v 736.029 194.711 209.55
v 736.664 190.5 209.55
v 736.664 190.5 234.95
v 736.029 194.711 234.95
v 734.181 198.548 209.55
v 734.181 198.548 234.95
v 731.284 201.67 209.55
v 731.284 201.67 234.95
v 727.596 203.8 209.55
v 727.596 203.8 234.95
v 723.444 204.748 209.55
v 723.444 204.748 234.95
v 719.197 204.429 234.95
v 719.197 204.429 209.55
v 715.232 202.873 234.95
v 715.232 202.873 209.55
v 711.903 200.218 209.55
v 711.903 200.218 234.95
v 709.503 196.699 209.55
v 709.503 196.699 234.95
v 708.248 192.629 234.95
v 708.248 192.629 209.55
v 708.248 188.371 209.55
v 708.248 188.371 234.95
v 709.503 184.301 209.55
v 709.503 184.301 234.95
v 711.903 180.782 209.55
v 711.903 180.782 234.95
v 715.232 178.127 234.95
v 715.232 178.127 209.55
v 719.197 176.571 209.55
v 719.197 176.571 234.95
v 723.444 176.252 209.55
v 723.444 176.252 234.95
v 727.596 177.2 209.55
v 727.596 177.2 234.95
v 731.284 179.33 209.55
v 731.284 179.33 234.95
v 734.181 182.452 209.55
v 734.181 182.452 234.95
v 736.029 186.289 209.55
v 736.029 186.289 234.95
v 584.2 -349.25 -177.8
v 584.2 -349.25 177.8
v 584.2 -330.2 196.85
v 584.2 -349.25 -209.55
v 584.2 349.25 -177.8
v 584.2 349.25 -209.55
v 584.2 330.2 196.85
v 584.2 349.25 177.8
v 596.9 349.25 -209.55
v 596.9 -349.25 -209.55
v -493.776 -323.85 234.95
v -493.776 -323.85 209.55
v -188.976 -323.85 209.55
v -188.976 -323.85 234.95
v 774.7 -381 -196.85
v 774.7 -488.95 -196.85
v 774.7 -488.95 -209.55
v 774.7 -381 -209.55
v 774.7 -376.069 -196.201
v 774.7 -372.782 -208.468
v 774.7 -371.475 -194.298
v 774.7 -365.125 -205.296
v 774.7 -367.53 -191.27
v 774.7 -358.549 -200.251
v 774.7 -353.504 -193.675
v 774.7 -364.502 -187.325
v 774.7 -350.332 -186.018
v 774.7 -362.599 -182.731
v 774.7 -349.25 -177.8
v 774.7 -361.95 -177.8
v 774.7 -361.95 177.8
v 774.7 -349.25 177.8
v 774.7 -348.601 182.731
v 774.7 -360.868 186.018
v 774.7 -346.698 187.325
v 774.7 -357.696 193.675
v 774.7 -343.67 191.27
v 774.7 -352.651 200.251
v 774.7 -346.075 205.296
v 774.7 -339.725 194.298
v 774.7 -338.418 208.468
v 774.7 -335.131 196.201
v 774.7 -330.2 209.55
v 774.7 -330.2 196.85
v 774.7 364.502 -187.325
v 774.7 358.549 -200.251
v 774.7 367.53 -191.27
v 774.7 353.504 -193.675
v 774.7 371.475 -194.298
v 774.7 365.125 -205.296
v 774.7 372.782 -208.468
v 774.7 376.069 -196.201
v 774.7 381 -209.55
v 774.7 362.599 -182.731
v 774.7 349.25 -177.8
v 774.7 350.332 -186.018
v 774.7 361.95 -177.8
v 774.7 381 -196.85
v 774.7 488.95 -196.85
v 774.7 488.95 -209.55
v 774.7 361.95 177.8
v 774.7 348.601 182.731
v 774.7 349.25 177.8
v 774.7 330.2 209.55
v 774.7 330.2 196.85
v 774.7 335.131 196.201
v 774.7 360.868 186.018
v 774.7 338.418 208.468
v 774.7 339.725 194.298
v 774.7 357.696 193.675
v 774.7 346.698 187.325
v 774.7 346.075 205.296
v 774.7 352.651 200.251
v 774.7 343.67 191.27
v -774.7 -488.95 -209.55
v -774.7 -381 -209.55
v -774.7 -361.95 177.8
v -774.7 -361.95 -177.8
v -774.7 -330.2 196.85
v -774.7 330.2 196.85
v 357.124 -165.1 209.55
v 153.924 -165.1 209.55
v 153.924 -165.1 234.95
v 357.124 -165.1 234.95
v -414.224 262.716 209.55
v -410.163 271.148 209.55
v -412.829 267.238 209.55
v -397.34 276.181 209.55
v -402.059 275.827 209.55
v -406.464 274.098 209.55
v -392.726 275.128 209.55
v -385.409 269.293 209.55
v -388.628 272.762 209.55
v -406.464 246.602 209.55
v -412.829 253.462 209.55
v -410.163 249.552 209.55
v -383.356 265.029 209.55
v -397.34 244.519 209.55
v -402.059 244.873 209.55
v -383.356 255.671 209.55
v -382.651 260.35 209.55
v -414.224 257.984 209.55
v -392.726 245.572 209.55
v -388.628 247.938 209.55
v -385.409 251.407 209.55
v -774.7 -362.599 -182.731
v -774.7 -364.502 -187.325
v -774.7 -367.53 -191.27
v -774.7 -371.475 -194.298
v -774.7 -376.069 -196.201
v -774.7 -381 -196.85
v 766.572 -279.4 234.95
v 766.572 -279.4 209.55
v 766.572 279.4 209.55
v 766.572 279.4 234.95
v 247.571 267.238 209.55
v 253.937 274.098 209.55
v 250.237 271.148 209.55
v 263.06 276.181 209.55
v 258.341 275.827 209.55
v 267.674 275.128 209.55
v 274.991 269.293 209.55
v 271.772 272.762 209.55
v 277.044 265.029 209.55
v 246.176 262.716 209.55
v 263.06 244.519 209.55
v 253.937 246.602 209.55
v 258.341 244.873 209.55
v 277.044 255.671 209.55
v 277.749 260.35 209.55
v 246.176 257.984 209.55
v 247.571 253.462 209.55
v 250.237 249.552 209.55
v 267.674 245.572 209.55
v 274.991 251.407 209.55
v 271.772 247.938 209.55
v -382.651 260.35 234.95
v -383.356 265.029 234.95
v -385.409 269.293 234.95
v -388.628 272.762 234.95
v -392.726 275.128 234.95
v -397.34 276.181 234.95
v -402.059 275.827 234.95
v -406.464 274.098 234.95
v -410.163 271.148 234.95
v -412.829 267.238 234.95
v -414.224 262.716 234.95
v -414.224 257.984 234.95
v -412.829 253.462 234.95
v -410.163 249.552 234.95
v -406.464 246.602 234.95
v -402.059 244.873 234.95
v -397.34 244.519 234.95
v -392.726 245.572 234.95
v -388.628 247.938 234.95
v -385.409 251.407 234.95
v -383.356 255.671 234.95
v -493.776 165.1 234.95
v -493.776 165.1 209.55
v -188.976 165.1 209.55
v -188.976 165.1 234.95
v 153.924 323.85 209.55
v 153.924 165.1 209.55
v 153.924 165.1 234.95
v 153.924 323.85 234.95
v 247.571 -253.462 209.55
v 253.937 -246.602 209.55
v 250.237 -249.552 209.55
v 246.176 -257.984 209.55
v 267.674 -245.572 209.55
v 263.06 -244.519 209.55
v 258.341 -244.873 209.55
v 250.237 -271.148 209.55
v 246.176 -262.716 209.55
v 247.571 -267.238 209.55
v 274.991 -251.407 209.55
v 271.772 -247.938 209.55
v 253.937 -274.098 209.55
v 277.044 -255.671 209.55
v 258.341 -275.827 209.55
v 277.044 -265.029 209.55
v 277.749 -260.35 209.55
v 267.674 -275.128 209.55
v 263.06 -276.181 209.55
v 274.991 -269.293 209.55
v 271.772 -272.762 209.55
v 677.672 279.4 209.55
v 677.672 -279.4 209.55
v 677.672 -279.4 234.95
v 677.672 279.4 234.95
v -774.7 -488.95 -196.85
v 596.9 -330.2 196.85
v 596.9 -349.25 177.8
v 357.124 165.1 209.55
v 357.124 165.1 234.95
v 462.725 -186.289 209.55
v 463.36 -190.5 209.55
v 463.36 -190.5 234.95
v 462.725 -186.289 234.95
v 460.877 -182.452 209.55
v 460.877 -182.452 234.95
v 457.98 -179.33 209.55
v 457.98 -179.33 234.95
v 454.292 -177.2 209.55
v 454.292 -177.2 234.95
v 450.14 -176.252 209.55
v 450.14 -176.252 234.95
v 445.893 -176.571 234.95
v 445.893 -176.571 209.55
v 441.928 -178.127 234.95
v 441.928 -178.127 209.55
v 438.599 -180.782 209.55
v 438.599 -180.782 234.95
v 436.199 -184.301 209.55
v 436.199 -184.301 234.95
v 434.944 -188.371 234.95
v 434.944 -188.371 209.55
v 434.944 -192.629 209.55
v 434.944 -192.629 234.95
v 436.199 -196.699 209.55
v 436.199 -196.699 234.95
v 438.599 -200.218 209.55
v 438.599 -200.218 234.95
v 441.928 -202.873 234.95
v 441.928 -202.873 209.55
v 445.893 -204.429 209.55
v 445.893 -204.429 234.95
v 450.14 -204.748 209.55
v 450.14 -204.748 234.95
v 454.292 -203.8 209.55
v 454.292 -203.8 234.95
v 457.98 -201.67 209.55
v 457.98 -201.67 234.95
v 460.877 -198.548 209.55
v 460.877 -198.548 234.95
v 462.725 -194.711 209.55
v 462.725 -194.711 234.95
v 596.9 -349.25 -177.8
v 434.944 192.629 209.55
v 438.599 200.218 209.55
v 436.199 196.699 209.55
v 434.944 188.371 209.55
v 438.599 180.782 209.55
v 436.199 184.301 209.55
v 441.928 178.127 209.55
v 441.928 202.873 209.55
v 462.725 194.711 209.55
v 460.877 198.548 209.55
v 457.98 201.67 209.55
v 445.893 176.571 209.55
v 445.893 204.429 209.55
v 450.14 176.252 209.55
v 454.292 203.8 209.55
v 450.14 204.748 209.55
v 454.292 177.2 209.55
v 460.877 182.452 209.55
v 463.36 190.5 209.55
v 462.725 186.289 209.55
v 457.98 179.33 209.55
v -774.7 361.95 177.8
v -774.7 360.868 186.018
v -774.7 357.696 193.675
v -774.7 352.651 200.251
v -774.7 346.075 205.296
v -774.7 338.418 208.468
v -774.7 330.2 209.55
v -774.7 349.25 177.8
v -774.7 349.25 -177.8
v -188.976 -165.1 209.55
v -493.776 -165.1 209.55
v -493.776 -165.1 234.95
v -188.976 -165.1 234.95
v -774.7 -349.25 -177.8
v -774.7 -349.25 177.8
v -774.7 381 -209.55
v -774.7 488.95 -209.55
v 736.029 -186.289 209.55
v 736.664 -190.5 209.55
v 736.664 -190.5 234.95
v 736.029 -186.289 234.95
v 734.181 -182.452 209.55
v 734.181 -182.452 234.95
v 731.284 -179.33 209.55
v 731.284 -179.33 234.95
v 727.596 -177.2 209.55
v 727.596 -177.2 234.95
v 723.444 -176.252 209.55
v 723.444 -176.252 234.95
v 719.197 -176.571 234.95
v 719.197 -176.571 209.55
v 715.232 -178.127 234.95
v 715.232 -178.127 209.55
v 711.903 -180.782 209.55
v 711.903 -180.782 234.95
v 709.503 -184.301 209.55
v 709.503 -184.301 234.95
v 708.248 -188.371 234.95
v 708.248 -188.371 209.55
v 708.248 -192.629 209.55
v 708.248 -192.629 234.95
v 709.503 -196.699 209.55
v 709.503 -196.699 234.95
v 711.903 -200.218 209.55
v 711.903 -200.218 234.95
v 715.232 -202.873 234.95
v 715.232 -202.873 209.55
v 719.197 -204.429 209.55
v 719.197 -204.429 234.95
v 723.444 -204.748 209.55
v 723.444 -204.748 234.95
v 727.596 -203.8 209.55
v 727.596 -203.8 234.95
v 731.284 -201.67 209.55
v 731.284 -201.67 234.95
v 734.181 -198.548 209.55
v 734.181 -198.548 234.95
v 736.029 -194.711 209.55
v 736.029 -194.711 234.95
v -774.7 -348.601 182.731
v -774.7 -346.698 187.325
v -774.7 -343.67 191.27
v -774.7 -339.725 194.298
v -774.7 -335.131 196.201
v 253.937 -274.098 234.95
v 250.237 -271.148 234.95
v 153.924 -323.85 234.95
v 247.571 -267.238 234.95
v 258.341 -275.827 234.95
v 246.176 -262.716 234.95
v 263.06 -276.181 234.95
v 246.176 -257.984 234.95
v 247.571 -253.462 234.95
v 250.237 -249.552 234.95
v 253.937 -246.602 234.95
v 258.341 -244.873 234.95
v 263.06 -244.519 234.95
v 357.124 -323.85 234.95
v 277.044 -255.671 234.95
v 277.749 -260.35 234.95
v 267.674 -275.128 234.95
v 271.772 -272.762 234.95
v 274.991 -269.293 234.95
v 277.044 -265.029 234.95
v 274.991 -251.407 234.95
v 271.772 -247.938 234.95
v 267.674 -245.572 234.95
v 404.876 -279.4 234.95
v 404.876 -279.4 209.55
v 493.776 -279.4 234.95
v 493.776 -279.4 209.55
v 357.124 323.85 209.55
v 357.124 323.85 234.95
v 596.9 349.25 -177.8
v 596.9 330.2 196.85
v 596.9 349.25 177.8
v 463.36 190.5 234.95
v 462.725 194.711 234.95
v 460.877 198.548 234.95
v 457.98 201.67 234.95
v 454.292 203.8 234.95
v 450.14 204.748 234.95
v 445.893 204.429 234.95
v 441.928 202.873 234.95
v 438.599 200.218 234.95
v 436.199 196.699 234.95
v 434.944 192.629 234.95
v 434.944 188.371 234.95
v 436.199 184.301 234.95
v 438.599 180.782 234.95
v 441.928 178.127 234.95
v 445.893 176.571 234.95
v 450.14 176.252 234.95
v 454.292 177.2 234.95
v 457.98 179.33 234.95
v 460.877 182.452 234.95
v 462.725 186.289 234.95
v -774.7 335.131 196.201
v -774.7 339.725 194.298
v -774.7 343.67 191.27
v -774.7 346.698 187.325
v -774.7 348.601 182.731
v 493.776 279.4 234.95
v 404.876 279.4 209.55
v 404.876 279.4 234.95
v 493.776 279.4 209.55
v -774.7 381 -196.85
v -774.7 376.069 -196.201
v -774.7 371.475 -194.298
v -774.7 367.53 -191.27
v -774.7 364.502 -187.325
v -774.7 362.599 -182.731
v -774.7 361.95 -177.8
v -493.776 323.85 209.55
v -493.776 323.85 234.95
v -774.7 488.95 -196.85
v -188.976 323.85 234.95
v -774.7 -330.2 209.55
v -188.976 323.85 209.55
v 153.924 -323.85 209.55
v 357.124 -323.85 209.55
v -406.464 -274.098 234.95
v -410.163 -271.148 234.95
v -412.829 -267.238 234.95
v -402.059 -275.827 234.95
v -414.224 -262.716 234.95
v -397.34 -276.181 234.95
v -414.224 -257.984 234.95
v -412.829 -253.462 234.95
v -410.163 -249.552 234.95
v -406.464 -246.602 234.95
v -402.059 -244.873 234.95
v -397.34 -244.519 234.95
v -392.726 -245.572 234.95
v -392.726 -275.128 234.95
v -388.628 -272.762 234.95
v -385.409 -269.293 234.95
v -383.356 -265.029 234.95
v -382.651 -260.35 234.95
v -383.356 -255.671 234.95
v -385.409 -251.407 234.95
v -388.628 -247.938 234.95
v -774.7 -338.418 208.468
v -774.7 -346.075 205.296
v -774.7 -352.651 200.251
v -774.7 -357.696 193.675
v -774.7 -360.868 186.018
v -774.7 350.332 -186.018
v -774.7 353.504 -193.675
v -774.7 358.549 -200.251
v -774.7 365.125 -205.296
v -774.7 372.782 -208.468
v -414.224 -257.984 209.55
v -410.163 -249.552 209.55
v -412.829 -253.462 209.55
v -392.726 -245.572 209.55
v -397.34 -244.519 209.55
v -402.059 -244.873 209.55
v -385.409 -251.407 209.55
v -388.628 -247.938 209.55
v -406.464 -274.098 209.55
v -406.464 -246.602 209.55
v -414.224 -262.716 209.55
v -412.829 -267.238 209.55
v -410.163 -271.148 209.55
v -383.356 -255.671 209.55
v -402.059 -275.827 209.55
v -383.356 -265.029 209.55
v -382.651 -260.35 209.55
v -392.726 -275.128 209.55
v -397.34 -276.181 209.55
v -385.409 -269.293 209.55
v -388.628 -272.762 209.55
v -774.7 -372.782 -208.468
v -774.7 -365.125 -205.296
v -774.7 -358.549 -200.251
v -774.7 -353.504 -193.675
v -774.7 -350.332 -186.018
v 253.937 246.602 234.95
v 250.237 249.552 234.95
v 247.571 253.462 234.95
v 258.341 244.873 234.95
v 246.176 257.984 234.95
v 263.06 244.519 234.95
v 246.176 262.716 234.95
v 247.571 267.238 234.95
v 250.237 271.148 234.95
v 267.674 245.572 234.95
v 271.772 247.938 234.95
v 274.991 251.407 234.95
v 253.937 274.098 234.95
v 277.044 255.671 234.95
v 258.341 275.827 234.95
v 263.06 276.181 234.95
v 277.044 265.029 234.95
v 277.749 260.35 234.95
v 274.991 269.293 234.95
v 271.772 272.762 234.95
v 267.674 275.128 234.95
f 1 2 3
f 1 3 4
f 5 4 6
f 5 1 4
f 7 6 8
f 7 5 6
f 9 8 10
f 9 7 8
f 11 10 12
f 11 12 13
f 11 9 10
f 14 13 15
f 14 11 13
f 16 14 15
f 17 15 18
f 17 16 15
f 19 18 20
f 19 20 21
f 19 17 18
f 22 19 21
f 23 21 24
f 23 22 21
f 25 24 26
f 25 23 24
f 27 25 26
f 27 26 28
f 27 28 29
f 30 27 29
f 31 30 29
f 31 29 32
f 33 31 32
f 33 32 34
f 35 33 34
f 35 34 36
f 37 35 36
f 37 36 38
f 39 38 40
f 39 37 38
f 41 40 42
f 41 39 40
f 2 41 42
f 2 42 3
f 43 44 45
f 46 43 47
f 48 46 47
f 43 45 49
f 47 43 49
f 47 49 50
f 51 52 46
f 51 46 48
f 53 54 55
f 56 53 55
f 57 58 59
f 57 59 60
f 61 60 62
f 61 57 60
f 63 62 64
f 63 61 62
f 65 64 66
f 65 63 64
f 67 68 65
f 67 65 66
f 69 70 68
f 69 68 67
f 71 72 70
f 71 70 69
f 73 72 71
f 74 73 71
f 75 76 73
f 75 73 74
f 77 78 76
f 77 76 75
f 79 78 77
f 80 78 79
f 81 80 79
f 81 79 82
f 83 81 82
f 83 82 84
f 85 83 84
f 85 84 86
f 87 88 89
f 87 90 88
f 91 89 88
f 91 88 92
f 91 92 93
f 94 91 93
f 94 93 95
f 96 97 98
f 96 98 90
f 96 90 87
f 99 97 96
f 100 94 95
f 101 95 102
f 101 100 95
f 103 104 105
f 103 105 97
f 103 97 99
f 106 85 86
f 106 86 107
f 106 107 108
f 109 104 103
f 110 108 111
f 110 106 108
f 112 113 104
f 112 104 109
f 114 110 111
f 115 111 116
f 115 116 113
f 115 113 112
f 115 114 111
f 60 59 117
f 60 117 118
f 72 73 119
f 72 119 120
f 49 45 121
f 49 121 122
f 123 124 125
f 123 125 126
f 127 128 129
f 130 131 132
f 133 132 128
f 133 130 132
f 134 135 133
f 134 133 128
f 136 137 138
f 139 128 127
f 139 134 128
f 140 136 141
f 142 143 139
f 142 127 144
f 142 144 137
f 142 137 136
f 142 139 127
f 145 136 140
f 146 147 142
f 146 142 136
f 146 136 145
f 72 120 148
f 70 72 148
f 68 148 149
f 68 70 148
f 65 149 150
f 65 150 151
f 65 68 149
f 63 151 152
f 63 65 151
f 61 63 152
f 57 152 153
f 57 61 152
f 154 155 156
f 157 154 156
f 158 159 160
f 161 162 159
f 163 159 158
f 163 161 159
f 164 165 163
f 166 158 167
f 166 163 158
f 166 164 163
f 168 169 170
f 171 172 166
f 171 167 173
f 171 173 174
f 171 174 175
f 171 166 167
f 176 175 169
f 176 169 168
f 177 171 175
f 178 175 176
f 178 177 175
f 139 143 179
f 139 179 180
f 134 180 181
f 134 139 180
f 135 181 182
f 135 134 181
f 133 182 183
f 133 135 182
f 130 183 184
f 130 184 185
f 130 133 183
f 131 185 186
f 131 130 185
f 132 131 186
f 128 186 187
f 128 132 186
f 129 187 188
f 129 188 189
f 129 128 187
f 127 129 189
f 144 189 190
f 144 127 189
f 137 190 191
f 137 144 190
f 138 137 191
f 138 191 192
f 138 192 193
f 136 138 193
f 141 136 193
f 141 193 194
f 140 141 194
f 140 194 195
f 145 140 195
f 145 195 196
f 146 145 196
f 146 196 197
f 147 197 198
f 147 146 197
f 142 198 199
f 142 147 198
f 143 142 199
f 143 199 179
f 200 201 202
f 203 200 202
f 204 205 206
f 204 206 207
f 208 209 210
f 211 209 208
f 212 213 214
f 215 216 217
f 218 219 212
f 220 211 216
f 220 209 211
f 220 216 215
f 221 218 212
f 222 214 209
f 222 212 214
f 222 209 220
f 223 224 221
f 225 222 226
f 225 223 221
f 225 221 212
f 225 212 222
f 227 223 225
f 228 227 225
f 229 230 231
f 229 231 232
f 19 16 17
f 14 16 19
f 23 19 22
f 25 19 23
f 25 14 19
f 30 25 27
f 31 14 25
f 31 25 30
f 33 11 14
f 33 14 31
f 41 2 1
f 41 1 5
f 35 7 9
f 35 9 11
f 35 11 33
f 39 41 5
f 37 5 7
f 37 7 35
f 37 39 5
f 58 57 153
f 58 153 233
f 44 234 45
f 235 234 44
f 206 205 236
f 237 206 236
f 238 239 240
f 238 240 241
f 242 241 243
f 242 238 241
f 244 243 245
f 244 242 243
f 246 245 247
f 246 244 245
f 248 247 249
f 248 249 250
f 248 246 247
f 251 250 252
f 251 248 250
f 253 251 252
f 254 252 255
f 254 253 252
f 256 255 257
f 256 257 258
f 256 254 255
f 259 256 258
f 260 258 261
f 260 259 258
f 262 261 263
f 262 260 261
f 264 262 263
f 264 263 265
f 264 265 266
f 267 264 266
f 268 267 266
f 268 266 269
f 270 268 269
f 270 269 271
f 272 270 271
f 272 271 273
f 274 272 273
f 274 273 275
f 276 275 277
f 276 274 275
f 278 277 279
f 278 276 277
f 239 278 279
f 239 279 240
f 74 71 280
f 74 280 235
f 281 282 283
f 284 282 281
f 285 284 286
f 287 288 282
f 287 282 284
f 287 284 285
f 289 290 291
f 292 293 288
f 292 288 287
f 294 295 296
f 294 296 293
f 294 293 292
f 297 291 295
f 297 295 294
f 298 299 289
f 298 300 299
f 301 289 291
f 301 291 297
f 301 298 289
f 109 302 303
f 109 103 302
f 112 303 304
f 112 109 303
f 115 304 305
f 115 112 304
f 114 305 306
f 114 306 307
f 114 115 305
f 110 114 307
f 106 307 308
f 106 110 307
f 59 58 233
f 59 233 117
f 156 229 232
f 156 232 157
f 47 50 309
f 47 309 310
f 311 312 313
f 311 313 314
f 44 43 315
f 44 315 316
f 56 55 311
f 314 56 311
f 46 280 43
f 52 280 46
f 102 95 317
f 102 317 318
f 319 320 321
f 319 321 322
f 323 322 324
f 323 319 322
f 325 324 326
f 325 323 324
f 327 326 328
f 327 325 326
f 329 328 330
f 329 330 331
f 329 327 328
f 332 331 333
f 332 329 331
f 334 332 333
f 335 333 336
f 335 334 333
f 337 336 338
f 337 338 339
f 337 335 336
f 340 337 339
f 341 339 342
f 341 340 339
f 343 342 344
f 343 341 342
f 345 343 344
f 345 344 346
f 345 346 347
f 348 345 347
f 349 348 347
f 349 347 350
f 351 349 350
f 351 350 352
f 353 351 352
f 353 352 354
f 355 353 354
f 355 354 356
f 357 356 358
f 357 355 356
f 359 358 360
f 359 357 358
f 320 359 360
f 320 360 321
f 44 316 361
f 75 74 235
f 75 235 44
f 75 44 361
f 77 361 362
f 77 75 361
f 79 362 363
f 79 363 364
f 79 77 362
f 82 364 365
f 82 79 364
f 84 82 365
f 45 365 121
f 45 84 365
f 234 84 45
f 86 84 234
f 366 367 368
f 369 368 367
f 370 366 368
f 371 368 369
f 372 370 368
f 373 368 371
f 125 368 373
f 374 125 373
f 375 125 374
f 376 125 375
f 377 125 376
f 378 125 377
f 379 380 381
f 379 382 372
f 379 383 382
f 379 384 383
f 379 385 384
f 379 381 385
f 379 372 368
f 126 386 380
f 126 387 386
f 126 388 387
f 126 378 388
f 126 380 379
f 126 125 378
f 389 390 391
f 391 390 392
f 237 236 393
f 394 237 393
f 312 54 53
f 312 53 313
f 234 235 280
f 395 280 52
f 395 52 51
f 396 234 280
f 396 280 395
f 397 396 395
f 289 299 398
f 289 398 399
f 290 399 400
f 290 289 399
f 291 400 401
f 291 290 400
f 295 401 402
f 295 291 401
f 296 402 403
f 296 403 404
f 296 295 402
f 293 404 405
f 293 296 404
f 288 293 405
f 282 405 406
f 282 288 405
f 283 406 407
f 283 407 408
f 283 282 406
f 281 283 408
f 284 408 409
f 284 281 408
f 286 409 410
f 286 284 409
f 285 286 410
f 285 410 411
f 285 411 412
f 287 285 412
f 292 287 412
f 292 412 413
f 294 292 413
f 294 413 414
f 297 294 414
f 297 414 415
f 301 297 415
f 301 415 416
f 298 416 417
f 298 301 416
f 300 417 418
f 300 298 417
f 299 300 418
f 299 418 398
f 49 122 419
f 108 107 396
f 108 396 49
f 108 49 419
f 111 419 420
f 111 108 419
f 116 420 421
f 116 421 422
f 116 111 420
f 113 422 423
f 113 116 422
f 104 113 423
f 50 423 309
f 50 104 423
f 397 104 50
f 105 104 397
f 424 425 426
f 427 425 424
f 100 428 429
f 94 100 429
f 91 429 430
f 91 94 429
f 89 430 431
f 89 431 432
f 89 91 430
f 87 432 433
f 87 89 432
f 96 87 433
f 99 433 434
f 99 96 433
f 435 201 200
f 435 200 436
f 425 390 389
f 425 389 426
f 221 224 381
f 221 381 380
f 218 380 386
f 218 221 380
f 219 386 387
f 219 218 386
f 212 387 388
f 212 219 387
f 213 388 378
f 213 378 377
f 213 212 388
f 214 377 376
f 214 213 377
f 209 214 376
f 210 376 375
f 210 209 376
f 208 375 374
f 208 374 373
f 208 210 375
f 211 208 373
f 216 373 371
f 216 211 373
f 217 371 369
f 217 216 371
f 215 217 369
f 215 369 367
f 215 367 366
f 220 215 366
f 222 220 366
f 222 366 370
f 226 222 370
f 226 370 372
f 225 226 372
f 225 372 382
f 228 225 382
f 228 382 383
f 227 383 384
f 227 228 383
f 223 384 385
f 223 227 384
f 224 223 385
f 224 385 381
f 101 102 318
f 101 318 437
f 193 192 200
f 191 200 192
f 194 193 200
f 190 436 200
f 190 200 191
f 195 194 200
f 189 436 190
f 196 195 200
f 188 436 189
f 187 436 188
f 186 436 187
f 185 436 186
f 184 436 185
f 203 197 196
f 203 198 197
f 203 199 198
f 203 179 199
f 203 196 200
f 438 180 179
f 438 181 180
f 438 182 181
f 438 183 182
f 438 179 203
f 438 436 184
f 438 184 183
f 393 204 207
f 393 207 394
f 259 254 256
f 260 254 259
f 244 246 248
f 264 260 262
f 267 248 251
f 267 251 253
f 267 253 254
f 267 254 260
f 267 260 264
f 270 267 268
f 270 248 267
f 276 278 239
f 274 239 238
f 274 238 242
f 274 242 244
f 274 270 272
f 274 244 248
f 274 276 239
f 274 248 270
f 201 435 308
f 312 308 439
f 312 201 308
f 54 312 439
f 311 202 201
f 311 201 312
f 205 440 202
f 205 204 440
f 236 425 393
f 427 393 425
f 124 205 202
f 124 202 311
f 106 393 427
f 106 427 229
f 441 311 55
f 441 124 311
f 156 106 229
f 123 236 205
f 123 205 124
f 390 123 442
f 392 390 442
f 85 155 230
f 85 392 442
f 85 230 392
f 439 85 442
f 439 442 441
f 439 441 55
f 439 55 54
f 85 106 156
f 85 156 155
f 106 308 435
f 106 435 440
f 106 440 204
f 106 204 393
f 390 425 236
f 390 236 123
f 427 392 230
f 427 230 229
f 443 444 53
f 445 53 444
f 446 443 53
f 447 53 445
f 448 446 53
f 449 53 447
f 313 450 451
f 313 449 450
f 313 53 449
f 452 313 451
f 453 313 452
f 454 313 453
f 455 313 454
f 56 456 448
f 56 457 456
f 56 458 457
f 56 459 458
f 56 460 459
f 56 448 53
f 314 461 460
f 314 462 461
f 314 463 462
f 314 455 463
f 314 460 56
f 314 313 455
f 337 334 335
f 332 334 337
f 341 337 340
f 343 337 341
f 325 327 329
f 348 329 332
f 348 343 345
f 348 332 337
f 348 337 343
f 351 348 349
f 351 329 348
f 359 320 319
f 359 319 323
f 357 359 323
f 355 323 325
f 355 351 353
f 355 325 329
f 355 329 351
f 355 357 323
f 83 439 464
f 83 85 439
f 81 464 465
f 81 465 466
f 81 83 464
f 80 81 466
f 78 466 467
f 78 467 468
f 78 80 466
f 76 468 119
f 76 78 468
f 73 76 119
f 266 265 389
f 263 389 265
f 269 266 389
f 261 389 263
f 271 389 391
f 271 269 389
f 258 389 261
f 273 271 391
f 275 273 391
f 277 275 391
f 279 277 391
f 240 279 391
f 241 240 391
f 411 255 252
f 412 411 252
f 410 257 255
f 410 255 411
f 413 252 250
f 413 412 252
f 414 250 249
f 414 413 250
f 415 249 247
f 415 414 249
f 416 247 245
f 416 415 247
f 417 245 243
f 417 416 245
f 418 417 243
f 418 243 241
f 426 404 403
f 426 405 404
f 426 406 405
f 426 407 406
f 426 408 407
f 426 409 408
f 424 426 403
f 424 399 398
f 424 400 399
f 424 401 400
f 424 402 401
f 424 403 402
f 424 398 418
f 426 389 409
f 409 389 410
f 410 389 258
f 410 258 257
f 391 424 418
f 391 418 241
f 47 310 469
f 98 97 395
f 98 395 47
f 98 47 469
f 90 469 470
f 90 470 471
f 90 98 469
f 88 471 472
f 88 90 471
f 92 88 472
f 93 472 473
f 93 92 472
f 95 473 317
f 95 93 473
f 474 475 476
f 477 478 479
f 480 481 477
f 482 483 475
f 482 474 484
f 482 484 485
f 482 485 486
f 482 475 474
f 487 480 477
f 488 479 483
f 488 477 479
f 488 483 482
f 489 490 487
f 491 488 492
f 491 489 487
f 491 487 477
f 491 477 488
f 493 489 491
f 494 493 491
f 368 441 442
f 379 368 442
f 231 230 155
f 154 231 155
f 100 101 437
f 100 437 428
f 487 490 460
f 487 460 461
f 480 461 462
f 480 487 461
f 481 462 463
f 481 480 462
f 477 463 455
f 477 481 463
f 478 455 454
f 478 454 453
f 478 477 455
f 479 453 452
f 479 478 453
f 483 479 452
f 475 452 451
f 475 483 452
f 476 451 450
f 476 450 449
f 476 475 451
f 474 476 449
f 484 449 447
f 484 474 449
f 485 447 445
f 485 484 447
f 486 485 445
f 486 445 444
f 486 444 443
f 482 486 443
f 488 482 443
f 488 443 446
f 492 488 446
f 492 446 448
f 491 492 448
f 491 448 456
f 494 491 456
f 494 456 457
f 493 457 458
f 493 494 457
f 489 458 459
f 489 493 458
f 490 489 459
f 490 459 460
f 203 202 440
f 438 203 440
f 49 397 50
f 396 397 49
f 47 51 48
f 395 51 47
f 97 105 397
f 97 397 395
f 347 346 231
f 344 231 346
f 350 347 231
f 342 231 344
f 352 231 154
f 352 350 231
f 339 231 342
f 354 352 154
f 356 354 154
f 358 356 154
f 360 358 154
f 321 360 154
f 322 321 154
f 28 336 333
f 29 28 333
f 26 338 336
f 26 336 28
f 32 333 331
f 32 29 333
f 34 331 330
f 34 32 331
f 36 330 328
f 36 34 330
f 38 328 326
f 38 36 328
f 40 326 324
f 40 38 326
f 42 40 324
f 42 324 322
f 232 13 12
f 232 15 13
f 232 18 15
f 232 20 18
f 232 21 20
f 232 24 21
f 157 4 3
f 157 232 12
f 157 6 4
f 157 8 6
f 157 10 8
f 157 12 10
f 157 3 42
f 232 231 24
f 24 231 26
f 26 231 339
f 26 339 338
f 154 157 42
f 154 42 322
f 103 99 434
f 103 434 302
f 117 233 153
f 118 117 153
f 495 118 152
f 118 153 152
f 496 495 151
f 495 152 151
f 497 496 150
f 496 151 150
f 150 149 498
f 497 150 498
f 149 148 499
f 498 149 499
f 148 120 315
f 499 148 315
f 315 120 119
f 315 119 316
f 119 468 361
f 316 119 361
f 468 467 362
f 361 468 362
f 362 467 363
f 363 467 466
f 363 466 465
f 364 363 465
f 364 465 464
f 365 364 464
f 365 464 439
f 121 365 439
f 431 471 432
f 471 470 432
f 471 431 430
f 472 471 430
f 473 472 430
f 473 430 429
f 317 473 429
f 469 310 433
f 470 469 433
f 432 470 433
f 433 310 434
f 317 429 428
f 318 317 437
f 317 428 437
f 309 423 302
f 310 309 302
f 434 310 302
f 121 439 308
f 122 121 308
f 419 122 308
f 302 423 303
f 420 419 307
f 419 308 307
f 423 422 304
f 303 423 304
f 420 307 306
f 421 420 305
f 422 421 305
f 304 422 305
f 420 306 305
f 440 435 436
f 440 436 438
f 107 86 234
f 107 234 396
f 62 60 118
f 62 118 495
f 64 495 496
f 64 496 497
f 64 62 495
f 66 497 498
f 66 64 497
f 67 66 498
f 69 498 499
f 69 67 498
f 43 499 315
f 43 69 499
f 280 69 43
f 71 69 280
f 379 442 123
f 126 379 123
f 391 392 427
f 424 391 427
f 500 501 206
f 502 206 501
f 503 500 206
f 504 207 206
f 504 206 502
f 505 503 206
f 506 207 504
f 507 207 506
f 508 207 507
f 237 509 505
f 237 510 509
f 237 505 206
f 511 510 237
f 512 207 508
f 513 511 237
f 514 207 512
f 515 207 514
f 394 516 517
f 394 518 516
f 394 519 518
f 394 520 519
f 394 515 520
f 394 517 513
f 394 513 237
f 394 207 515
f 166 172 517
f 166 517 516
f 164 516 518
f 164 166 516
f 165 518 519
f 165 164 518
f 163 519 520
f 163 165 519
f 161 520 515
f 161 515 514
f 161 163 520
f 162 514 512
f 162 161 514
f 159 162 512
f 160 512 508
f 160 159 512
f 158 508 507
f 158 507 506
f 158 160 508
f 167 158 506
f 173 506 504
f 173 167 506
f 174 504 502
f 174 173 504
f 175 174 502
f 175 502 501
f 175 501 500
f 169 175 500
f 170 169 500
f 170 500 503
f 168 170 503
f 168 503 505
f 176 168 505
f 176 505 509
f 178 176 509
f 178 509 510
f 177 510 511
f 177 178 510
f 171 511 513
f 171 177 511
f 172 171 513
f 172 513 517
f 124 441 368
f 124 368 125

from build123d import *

# Parameters (mm, degrees)
F1_DEPTH = 774.7
F2_W     = 304.8
F2_H     = 158.75
F2_R     = 15.875
F2_W_2   = 203.2
F2_W_3   = 88.9
F2_H_2   = 558.8
F2_R_2   = 14.2875
F3_DEPTH = 25.4
F6_DEPTH = 12.7


with BuildPart() as f1:
    # F0 (on Right) → F1 (new body, symmetric)
    with BuildSketch(Plane.YZ):
        with BuildLine():
            Line((0, 209.55), (-330.2, 209.55))
            ThreePointArc((-330.2, 209.55), (-352.6506403027, 200.2506403027), (-361.95, 177.8))
            Line((-361.95, 177.8), (-361.95, -177.8))
            ThreePointArc((-361.95, -177.8), (-367.5296158184, -191.2703841816), (-381, -196.85))
            Line((-381, -196.85), (-488.95, -196.85))
            Line((-488.95, -196.85), (-488.95, -209.55))
            Line((-488.95, -209.55), (-381, -209.55))
            ThreePointArc((-381, -209.55), (-358.5493596973, -200.2506403027), (-349.25, -177.8))
            Line((-349.25, -177.8), (-349.25, 177.8))
            ThreePointArc((-349.25, 177.8), (-343.6703841816, 191.2703841816), (-330.2, 196.85))
            Line((-330.2, 196.85), (0, 196.85))
            Line((0, 196.85), (330.2, 196.85))
            ThreePointArc((330.2, 196.85), (343.6703841816, 191.2703841816), (349.25, 177.8))
            Line((349.25, 177.8), (349.25, -177.8))
            ThreePointArc((349.25, -177.8), (358.5493596973, -200.2506403027), (381, -209.55))
            Line((381, -209.55), (488.95, -209.55))
            Line((488.95, -209.55), (488.95, -196.85))
            Line((488.95, -196.85), (381, -196.85))
            ThreePointArc((381, -196.85), (367.5296158184, -191.2703841816), (361.95, -177.8))
            Line((361.95, -177.8), (361.95, 177.8))
            ThreePointArc((361.95, 177.8), (352.6506403027, 200.2506403027), (330.2, 209.55))
            Line((330.2, 209.55), (0, 209.55))
        make_face()
    extrude(amount=F1_DEPTH, both=True)

    # F2 (on face) → F3 (join)
    with BuildSketch(Plane.XY.offset(209.55)):
        with Locations((-341.376, -244.475)):
            Rectangle(F2_W, F2_H)
        with Locations((-398.526, -260.35)):
            Circle(F2_R, mode=Mode.SUBTRACT)
        with Locations((255.524, -244.475)):
            Rectangle(F2_W_2, F2_H)
        with Locations((261.874, -260.35)):
            Circle(F2_R, mode=Mode.SUBTRACT)
        with Locations((255.524, 244.475)):
            Rectangle(F2_W_2, F2_H)
        with Locations((261.874, 260.35)):
            Circle(F2_R, mode=Mode.SUBTRACT)
        with Locations((-341.376, 244.475)):
            Rectangle(F2_W, F2_H)
        with Locations((-398.526, 260.35)):
            Circle(F2_R, mode=Mode.SUBTRACT)
        with Locations((449.326, 0)):
            Rectangle(F2_W_3, F2_H_2)
        with Locations((449.072, -190.5)):
            Circle(F2_R_2, mode=Mode.SUBTRACT)
        with Locations((449.072, 190.5)):
            Circle(F2_R_2, mode=Mode.SUBTRACT)
        with Locations((722.122, 0)):
            Rectangle(F2_W_3, F2_H_2)
        with Locations((722.376, -190.5)):
            Circle(F2_R_2, mode=Mode.SUBTRACT)
        with Locations((722.376, 190.5)):
            Circle(F2_R_2, mode=Mode.SUBTRACT)
    extrude(amount=F3_DEPTH)

    # F5 (on offset) → F6 (join)
    with BuildSketch(Plane.YZ.offset(596.9)):
        Polygon((330.2, 196.85), (-330.2, 196.85), (-349.25, 177.8), (-349.25, -209.55), (349.25, -209.55), (349.25, 177.8), align=None)
    extrude(amount=-F6_DEPTH)


solid = f1.part
